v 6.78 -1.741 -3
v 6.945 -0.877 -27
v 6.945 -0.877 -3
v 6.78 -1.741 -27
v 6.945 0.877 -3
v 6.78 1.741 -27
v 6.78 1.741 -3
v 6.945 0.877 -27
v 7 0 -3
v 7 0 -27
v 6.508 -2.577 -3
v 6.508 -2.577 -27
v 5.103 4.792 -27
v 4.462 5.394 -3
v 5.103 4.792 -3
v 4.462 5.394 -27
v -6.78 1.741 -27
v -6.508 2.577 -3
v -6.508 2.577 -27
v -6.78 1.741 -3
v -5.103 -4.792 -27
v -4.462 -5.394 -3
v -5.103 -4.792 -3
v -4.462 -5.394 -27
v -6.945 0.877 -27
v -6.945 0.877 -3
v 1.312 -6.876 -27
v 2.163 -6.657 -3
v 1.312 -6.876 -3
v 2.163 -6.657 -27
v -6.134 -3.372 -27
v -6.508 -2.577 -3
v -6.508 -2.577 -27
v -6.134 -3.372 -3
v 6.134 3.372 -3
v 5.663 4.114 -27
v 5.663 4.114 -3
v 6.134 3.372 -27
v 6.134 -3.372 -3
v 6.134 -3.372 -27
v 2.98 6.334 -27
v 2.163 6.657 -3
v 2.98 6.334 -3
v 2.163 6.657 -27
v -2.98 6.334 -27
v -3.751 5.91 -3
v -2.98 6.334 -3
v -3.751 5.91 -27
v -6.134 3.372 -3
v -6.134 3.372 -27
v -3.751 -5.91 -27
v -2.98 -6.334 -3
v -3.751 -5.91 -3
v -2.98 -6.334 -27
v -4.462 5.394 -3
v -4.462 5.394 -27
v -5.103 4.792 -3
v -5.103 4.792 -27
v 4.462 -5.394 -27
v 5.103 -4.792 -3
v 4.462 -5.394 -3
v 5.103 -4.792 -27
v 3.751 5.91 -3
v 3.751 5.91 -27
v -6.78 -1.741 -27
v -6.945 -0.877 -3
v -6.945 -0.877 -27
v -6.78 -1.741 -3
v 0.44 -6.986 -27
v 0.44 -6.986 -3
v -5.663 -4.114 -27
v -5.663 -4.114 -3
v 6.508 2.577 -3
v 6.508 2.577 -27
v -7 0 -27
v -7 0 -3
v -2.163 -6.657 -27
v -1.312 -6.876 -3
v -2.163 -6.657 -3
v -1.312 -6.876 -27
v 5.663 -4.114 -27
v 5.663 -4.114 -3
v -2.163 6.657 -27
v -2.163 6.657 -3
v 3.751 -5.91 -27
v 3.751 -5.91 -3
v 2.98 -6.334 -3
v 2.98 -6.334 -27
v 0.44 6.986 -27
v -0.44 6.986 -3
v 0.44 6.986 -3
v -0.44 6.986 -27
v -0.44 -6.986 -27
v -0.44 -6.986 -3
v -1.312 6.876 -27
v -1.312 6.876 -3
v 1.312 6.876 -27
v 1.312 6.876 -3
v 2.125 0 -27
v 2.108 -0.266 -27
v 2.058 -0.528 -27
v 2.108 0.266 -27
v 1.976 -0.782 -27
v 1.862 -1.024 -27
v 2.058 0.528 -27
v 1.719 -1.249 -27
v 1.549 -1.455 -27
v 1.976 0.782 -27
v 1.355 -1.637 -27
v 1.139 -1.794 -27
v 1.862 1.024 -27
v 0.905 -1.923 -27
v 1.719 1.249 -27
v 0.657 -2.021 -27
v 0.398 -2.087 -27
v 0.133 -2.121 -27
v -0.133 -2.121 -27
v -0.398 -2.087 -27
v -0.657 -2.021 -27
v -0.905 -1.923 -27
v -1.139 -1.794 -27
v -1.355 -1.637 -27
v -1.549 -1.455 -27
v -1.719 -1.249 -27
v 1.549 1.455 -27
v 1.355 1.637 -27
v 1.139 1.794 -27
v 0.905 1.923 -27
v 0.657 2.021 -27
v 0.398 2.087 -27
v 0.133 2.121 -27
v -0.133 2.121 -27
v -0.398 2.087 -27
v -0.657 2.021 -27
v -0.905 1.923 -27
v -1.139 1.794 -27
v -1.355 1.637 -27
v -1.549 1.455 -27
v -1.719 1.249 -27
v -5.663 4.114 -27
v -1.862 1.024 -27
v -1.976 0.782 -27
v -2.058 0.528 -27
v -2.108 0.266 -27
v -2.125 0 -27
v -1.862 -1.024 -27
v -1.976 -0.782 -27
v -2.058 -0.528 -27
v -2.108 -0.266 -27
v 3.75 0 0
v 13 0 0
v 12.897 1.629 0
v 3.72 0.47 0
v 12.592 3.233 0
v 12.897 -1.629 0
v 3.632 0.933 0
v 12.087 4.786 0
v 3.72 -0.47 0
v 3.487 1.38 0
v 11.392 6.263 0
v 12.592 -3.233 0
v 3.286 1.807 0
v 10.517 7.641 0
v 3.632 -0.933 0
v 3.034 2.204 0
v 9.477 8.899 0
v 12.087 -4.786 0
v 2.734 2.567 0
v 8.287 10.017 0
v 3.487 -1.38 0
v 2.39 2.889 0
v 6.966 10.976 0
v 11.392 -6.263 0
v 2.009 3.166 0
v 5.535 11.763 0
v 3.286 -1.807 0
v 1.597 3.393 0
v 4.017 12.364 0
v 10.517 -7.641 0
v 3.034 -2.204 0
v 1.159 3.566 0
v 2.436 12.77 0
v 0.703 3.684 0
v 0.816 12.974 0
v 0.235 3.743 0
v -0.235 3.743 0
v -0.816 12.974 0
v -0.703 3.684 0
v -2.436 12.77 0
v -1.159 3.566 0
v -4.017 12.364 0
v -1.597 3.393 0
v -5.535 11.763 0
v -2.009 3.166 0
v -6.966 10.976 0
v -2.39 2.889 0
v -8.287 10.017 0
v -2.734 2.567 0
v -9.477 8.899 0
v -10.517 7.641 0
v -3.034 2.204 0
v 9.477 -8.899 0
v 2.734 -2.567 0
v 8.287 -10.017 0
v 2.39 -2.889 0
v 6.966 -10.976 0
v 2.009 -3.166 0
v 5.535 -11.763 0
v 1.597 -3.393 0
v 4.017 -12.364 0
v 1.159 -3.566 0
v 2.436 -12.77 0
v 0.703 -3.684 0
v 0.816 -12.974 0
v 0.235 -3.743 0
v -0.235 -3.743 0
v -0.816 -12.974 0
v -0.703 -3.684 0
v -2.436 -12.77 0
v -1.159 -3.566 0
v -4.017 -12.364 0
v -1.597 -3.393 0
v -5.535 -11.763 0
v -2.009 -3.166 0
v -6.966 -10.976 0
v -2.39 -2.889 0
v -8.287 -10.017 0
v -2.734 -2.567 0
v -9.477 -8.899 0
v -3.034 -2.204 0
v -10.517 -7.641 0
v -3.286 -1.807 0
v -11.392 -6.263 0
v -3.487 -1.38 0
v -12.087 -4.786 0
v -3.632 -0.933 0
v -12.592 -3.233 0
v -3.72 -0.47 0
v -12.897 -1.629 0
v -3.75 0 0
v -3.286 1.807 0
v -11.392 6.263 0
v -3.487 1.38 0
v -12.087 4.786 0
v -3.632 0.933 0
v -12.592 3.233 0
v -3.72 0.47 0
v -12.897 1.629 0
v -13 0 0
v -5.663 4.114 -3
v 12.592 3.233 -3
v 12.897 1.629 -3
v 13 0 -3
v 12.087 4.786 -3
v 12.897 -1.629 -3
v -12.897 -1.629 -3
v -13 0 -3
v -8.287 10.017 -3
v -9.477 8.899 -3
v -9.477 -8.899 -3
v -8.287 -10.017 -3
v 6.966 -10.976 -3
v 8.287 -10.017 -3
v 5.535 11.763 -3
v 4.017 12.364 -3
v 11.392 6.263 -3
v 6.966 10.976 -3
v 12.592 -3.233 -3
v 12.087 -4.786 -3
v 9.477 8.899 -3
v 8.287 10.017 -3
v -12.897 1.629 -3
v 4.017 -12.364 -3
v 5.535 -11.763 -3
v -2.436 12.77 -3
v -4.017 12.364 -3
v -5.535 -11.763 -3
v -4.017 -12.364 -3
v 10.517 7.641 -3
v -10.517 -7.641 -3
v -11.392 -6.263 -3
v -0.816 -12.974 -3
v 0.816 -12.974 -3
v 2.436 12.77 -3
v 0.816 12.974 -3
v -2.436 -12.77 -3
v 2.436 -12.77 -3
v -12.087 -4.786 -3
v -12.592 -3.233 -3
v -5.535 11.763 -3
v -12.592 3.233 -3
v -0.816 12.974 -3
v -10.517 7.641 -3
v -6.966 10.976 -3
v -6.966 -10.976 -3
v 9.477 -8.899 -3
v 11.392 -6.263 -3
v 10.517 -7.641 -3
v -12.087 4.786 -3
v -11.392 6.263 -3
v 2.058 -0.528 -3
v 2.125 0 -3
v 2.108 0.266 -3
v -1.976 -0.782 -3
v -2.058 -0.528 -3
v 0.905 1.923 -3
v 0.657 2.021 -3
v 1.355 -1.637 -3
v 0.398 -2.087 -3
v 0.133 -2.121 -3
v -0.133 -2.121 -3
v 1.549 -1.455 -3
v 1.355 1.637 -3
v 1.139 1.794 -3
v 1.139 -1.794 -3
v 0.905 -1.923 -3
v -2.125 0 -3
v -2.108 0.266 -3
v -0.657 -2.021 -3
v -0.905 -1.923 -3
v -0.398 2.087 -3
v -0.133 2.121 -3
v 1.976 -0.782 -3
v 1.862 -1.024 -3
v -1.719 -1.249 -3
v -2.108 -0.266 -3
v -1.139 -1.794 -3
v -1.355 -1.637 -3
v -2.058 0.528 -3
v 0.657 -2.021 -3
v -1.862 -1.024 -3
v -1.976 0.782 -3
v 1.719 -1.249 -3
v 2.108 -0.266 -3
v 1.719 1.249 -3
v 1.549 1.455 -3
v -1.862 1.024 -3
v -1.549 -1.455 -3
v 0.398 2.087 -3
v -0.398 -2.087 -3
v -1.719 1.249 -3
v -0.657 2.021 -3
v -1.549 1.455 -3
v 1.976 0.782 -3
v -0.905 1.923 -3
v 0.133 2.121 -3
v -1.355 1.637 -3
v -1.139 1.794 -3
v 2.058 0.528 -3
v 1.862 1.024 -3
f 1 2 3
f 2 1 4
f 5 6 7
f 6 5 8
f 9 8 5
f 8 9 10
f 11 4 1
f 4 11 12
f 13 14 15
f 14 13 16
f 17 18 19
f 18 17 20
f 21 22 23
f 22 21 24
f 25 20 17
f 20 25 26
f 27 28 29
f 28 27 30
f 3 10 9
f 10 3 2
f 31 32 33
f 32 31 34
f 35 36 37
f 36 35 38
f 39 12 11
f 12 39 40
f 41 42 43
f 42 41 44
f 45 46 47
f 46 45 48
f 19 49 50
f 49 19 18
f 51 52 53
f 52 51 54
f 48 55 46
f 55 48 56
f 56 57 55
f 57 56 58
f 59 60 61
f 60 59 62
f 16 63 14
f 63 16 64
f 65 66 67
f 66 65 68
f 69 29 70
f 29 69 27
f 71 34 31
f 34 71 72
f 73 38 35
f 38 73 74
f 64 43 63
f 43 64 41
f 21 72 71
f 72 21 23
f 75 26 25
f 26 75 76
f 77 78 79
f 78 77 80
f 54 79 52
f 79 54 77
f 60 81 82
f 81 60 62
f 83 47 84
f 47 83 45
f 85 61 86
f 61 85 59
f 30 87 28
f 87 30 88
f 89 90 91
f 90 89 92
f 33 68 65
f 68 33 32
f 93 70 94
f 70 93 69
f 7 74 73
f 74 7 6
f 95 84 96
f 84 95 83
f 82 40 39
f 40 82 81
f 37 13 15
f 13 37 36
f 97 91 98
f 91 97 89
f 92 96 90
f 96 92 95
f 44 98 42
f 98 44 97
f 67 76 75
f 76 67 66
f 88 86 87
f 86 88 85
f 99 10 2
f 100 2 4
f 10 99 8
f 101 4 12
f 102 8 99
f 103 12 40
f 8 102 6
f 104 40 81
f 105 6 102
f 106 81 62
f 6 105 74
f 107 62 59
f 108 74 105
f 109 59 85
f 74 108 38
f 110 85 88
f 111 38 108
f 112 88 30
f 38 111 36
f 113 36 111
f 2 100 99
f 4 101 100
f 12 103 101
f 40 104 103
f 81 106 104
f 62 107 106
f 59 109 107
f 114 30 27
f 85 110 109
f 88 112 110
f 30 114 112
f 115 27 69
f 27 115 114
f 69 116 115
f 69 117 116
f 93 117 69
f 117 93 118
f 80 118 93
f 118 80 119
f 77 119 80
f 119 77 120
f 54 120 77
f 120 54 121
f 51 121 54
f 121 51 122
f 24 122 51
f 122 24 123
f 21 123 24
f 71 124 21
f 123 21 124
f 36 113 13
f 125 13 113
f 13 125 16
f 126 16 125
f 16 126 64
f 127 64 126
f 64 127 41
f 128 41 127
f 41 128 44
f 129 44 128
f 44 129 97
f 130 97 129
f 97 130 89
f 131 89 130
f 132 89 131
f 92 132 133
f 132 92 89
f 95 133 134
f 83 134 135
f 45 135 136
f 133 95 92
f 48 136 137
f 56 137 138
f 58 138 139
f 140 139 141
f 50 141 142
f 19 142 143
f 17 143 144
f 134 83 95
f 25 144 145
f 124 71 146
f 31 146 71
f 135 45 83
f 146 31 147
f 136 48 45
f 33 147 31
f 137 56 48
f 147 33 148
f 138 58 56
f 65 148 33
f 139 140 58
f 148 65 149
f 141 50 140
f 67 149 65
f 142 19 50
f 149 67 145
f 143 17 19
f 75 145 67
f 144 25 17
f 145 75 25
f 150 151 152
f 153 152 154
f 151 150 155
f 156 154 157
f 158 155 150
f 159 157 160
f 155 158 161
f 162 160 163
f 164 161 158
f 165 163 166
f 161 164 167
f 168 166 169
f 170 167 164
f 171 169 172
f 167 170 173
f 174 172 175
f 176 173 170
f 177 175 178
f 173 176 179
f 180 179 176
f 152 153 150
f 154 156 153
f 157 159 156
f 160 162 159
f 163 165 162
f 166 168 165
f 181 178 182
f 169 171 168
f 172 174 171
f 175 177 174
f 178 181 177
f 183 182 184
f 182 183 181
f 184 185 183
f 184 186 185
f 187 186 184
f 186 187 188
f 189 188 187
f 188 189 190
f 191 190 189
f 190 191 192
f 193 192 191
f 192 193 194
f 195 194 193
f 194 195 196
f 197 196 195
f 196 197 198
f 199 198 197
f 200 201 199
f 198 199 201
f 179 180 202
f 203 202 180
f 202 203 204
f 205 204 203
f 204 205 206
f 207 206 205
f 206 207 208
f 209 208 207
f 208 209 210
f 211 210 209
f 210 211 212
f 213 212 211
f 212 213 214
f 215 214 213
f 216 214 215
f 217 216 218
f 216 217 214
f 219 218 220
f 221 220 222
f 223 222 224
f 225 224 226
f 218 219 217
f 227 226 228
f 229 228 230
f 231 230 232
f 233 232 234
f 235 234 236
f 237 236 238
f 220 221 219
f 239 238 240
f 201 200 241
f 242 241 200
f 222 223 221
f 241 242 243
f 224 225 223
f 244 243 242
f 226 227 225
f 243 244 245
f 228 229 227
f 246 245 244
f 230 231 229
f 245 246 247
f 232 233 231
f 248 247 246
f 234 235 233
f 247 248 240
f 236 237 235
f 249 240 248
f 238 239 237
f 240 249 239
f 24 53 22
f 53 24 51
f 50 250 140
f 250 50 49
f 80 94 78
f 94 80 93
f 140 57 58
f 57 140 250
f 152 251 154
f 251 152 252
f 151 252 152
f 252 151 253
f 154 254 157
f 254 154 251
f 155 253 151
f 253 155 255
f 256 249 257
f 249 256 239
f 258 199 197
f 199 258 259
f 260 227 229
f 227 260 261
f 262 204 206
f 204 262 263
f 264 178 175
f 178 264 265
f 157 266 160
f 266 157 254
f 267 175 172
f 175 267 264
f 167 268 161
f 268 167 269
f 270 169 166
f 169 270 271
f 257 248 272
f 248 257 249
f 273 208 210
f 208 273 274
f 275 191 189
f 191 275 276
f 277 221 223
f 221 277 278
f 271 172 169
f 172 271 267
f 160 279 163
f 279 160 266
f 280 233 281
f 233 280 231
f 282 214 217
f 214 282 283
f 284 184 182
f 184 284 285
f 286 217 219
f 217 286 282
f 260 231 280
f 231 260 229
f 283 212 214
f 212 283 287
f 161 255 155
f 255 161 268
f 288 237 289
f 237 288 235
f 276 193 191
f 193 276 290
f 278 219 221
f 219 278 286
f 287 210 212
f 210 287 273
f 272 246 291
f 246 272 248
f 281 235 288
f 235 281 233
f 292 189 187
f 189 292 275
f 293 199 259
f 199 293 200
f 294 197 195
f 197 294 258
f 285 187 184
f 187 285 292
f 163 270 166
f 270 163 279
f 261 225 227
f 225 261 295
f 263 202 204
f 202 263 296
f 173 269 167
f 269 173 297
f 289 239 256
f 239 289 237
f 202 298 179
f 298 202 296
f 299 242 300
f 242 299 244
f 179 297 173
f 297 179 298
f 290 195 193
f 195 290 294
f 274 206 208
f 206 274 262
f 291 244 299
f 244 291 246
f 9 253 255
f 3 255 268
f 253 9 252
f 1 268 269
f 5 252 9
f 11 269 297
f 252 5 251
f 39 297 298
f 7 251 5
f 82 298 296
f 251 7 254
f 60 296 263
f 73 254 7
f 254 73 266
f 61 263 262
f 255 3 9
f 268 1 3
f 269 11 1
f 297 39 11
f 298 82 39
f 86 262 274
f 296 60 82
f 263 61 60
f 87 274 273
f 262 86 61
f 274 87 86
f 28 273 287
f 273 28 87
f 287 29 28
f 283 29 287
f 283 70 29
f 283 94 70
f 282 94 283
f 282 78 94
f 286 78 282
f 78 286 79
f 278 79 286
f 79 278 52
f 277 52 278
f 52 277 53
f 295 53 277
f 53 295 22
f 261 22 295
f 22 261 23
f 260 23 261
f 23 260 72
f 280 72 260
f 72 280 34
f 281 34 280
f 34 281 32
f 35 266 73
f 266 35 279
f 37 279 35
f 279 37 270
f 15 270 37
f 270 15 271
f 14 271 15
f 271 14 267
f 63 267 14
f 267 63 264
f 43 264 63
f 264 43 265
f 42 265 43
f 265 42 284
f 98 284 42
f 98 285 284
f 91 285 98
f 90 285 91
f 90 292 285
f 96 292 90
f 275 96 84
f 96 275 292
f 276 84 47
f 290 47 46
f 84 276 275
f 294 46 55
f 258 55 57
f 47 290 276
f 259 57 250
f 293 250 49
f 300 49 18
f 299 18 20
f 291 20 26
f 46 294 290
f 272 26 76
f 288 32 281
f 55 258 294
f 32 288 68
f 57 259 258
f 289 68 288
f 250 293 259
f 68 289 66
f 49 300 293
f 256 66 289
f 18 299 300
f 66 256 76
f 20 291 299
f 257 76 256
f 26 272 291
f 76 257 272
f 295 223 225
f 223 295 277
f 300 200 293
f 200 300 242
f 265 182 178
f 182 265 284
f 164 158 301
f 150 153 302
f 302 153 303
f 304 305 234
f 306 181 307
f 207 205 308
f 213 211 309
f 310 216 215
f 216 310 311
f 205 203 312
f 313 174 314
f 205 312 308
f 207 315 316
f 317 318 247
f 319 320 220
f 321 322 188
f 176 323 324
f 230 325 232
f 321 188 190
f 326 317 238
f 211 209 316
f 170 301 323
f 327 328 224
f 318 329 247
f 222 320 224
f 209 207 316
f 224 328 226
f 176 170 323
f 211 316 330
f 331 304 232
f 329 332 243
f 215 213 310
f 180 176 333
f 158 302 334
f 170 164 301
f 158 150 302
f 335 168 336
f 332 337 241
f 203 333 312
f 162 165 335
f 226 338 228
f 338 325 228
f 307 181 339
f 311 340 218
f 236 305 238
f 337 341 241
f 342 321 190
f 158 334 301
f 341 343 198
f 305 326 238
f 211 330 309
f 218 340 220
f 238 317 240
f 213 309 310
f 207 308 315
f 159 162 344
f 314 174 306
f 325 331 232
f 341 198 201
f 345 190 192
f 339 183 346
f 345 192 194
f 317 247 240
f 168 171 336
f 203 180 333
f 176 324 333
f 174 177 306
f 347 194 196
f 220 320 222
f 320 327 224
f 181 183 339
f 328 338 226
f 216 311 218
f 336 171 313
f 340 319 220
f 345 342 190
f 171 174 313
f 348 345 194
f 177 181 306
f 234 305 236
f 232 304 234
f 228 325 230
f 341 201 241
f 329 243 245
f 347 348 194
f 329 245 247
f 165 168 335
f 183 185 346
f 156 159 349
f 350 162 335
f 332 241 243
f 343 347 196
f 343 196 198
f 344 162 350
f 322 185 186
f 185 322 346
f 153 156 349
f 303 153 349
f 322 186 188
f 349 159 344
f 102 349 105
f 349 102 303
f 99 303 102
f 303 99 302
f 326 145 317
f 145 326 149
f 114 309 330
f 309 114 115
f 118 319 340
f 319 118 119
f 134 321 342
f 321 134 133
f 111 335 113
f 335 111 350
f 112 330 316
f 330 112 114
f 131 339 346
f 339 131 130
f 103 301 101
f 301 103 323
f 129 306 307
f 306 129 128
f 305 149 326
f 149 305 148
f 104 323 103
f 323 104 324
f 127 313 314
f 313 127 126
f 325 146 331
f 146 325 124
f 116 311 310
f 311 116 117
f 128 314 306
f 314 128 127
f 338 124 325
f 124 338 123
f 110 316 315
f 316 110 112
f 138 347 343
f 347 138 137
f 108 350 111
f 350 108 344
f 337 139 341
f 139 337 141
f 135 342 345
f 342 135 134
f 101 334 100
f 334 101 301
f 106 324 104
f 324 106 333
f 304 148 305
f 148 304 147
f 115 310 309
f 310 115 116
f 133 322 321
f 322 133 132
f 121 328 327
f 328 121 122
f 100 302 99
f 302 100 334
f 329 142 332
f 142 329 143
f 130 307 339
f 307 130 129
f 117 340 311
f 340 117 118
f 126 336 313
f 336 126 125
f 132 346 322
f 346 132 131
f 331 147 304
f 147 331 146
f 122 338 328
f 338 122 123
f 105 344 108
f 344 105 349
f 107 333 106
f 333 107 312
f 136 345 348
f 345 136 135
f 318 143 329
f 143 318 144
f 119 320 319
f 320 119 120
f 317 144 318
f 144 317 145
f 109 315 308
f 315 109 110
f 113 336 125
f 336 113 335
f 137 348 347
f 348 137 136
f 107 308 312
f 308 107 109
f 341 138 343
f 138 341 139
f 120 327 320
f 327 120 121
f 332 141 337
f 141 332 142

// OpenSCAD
$fn = 50;


difference() {
	union() {
		translate(v = [0, 0, -27.0000000000]) {
			cylinder(h = 27, r = 7.0000000000);
		}
		translate(v = [0, 0, -3.0000000000]) {
			cylinder(h = 3, r = 13.0000000000);
		}
	}
	union() {
		translate(v = [0, 0, 0]) {
			rotate(a = [0, 0, 0]) {
				difference() {
					union() {
						#translate(v = [0, 0, -27.0000000000]) {
							cylinder(h = 27, r = 2.0000000000);
						}
						#translate(v = [0, 0, -3]) {
							cylinder(h = 3, r1 = 2.1250000000, r2 = 3.7500000000);
						}
						#translate(v = [0, 0, -27.0000000000]) {
							cylinder(h = 27, r = 2.1250000000);
						}
						#translate(v = [0, 0, -27.0000000000]) {
							cylinder(h = 27, r = 2.0000000000);
						}
					}
					union();
				}
			}
		}
	}
}
